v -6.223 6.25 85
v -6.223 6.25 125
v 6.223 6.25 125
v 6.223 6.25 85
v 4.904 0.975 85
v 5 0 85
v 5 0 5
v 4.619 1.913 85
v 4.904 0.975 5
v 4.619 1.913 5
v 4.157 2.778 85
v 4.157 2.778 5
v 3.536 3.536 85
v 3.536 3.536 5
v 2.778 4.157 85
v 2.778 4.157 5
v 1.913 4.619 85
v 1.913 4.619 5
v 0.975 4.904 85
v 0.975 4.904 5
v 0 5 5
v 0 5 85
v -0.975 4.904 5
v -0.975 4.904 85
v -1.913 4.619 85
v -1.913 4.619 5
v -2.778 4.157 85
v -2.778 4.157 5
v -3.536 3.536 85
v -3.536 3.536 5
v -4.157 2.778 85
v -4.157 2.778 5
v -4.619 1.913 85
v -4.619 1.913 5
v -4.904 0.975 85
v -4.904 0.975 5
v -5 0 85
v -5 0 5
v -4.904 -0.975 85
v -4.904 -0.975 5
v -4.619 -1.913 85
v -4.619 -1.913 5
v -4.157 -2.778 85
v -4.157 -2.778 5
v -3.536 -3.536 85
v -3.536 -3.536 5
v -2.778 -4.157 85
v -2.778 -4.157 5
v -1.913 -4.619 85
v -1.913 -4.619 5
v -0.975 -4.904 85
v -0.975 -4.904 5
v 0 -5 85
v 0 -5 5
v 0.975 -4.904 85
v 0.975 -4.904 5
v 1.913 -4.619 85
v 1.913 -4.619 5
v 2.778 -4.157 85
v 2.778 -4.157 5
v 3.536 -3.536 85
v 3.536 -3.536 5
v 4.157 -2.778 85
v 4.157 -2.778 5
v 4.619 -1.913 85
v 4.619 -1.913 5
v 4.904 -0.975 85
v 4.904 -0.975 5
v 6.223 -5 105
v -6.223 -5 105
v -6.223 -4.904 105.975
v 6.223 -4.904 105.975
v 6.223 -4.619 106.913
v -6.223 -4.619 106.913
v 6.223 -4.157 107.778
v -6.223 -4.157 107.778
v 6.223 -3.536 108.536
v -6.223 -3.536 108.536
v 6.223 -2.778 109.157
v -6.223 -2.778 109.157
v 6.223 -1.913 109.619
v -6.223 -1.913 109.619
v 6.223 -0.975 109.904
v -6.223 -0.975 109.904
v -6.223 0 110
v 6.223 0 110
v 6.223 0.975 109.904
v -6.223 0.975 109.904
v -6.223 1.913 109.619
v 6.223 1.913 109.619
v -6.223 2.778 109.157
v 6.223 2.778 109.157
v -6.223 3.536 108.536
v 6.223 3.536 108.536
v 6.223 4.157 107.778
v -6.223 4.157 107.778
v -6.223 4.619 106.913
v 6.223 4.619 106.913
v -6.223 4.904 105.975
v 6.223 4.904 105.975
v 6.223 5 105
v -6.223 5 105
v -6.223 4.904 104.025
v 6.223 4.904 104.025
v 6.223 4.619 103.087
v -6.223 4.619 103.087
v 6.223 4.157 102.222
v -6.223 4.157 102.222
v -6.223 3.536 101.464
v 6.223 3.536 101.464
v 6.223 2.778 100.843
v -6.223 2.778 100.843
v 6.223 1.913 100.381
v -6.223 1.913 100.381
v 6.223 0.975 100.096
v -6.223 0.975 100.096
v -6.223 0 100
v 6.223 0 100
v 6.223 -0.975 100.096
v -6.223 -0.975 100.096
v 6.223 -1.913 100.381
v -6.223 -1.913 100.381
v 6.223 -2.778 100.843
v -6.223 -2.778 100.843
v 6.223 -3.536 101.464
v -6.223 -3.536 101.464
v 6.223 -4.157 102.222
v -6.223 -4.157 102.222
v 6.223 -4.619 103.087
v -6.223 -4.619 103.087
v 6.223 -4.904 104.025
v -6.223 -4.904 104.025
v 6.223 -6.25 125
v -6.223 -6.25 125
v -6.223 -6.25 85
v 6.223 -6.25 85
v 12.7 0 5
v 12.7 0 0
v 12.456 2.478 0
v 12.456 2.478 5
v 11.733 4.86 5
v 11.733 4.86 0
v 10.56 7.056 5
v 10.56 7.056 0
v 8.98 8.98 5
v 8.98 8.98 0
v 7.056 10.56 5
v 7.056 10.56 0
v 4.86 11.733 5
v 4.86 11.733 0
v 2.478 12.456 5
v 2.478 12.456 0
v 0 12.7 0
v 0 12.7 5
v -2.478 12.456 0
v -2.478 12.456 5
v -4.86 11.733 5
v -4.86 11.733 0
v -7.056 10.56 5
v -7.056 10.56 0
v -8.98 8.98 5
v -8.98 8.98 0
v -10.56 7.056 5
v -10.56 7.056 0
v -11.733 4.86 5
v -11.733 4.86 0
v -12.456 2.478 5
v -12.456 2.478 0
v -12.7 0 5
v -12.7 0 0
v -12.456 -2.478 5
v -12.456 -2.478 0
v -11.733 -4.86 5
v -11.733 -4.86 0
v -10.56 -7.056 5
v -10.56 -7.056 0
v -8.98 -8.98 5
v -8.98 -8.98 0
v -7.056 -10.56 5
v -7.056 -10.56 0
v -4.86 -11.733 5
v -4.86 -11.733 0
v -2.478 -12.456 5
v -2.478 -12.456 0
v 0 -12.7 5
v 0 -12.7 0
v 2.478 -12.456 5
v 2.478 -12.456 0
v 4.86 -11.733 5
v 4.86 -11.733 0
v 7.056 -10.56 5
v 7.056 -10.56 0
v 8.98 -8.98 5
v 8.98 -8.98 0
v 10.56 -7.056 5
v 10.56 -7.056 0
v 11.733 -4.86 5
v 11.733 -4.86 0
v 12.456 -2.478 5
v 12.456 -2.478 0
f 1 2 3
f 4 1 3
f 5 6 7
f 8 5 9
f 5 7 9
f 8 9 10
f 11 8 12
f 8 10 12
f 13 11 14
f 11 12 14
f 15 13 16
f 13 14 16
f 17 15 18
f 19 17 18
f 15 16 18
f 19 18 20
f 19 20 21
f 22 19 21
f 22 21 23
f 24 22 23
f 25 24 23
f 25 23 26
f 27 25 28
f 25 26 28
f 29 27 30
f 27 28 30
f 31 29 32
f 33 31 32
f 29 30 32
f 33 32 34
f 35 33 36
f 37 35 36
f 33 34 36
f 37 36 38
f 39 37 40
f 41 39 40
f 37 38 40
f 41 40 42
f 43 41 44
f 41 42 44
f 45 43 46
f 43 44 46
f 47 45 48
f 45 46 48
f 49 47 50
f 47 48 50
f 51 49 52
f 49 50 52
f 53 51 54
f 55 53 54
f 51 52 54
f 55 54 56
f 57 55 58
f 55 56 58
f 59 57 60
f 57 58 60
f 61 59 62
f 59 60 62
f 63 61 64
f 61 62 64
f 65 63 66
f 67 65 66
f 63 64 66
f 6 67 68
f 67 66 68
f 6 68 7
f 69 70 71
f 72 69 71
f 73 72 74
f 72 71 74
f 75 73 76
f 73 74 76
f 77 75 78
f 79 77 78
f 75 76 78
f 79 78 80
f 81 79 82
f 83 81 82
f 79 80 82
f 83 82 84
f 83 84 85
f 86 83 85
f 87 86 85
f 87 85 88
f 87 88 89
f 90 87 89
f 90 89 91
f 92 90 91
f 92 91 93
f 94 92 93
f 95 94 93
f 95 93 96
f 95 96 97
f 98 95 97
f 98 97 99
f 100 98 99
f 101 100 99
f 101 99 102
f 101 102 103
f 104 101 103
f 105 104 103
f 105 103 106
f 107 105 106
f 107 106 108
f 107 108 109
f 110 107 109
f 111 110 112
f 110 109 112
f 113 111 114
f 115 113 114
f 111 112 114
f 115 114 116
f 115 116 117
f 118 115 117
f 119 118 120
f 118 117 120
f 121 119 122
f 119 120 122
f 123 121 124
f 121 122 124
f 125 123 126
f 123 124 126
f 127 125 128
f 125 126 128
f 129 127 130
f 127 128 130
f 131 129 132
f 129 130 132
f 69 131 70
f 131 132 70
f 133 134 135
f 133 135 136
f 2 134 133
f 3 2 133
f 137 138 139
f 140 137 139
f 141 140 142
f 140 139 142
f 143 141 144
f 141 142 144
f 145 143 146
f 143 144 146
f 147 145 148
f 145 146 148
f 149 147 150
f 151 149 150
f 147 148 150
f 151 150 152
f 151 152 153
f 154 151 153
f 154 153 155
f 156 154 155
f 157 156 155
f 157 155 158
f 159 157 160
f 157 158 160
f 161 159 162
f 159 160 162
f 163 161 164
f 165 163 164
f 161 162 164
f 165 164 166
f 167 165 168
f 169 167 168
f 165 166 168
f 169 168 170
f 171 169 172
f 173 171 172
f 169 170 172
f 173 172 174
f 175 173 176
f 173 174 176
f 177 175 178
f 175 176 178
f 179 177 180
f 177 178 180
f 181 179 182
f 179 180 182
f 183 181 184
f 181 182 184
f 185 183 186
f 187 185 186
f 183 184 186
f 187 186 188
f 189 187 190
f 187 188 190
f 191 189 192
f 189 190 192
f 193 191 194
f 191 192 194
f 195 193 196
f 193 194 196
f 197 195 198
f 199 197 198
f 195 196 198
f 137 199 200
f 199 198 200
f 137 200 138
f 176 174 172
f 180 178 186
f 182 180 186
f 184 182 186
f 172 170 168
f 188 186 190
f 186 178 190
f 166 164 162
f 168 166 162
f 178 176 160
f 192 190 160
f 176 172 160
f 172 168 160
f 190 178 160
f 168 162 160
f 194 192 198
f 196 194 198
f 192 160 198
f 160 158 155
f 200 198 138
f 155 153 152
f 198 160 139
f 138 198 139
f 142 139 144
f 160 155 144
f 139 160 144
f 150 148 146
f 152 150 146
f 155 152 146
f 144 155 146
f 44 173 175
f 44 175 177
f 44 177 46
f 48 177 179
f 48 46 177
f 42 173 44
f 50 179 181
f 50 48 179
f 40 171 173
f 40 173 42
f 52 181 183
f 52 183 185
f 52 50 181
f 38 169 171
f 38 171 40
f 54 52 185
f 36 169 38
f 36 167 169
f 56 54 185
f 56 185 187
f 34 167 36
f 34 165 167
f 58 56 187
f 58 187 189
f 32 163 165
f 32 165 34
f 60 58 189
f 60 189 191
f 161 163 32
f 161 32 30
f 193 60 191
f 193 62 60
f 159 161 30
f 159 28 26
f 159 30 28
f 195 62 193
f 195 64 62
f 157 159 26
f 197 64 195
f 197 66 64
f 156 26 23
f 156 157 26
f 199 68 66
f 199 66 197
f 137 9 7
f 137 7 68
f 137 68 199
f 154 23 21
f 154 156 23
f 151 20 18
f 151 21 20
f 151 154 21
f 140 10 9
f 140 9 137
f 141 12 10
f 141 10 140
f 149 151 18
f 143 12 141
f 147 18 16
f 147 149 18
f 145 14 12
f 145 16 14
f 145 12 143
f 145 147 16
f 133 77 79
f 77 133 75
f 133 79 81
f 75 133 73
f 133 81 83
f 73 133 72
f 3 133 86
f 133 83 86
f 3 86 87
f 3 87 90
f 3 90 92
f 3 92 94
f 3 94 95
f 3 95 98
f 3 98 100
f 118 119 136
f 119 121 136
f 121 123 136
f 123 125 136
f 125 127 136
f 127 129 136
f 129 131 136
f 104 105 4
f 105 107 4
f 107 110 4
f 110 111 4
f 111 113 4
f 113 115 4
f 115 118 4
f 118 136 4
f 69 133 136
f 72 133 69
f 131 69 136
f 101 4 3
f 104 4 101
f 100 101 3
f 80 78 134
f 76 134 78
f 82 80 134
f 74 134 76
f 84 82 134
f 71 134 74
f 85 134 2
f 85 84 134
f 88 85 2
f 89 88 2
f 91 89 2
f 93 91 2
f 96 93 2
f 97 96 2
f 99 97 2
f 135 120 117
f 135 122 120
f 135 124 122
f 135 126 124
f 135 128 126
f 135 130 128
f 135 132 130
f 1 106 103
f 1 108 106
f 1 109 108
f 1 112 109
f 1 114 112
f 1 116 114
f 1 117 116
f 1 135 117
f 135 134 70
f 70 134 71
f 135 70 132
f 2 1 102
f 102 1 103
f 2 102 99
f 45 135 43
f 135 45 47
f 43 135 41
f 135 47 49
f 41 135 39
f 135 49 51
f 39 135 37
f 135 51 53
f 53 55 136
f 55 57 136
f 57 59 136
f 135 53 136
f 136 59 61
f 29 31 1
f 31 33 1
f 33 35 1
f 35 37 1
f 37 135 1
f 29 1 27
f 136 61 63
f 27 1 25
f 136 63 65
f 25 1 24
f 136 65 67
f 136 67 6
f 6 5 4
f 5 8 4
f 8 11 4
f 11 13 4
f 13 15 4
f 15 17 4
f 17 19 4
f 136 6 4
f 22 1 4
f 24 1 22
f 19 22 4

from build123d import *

# Parameters (mm, degrees)
SKETCH1_R           = 12.7
BOSS_EXTRUDE1_DEPTH = 5
SKETCH2_R           = 5
BOSS_EXTRUDE3_DEPTH = 80
SKETCH3_W           = 12.446
SKETCH3_H           = 12.5
BOSS_EXTRUDE4_DEPTH = 40
SKETCH4_R           = 5
CUT_EXTRUDE1_DEPTH  = 128.060497122


with BuildPart() as part:
    # Sketch1 → Boss-Extrude1 (new body)
    with BuildSketch(Plane.XY):
        Circle(SKETCH1_R)
    extrude(amount=BOSS_EXTRUDE1_DEPTH)

    # Sketch2 → Boss-Extrude3 (add)
    with BuildSketch(Plane.XY.offset(5)):
        Circle(SKETCH2_R)
    extrude(amount=BOSS_EXTRUDE3_DEPTH)

    # Sketch3 → Boss-Extrude4 (add)
    with BuildSketch(Plane.XY.offset(85)):
        Rectangle(SKETCH3_W, SKETCH3_H)
    extrude(amount=BOSS_EXTRUDE4_DEPTH)

    # Sketch4 → Cut-Extrude1 (cut, through all)
    with BuildSketch(Plane.ZY.offset(6.223)):
        with Locations(Location((105, 0, 0), (0, 0, 270))):
            Circle(SKETCH4_R)
    extrude(amount=-CUT_EXTRUDE1_DEPTH, mode=Mode.SUBTRACT)


solid = part.part
